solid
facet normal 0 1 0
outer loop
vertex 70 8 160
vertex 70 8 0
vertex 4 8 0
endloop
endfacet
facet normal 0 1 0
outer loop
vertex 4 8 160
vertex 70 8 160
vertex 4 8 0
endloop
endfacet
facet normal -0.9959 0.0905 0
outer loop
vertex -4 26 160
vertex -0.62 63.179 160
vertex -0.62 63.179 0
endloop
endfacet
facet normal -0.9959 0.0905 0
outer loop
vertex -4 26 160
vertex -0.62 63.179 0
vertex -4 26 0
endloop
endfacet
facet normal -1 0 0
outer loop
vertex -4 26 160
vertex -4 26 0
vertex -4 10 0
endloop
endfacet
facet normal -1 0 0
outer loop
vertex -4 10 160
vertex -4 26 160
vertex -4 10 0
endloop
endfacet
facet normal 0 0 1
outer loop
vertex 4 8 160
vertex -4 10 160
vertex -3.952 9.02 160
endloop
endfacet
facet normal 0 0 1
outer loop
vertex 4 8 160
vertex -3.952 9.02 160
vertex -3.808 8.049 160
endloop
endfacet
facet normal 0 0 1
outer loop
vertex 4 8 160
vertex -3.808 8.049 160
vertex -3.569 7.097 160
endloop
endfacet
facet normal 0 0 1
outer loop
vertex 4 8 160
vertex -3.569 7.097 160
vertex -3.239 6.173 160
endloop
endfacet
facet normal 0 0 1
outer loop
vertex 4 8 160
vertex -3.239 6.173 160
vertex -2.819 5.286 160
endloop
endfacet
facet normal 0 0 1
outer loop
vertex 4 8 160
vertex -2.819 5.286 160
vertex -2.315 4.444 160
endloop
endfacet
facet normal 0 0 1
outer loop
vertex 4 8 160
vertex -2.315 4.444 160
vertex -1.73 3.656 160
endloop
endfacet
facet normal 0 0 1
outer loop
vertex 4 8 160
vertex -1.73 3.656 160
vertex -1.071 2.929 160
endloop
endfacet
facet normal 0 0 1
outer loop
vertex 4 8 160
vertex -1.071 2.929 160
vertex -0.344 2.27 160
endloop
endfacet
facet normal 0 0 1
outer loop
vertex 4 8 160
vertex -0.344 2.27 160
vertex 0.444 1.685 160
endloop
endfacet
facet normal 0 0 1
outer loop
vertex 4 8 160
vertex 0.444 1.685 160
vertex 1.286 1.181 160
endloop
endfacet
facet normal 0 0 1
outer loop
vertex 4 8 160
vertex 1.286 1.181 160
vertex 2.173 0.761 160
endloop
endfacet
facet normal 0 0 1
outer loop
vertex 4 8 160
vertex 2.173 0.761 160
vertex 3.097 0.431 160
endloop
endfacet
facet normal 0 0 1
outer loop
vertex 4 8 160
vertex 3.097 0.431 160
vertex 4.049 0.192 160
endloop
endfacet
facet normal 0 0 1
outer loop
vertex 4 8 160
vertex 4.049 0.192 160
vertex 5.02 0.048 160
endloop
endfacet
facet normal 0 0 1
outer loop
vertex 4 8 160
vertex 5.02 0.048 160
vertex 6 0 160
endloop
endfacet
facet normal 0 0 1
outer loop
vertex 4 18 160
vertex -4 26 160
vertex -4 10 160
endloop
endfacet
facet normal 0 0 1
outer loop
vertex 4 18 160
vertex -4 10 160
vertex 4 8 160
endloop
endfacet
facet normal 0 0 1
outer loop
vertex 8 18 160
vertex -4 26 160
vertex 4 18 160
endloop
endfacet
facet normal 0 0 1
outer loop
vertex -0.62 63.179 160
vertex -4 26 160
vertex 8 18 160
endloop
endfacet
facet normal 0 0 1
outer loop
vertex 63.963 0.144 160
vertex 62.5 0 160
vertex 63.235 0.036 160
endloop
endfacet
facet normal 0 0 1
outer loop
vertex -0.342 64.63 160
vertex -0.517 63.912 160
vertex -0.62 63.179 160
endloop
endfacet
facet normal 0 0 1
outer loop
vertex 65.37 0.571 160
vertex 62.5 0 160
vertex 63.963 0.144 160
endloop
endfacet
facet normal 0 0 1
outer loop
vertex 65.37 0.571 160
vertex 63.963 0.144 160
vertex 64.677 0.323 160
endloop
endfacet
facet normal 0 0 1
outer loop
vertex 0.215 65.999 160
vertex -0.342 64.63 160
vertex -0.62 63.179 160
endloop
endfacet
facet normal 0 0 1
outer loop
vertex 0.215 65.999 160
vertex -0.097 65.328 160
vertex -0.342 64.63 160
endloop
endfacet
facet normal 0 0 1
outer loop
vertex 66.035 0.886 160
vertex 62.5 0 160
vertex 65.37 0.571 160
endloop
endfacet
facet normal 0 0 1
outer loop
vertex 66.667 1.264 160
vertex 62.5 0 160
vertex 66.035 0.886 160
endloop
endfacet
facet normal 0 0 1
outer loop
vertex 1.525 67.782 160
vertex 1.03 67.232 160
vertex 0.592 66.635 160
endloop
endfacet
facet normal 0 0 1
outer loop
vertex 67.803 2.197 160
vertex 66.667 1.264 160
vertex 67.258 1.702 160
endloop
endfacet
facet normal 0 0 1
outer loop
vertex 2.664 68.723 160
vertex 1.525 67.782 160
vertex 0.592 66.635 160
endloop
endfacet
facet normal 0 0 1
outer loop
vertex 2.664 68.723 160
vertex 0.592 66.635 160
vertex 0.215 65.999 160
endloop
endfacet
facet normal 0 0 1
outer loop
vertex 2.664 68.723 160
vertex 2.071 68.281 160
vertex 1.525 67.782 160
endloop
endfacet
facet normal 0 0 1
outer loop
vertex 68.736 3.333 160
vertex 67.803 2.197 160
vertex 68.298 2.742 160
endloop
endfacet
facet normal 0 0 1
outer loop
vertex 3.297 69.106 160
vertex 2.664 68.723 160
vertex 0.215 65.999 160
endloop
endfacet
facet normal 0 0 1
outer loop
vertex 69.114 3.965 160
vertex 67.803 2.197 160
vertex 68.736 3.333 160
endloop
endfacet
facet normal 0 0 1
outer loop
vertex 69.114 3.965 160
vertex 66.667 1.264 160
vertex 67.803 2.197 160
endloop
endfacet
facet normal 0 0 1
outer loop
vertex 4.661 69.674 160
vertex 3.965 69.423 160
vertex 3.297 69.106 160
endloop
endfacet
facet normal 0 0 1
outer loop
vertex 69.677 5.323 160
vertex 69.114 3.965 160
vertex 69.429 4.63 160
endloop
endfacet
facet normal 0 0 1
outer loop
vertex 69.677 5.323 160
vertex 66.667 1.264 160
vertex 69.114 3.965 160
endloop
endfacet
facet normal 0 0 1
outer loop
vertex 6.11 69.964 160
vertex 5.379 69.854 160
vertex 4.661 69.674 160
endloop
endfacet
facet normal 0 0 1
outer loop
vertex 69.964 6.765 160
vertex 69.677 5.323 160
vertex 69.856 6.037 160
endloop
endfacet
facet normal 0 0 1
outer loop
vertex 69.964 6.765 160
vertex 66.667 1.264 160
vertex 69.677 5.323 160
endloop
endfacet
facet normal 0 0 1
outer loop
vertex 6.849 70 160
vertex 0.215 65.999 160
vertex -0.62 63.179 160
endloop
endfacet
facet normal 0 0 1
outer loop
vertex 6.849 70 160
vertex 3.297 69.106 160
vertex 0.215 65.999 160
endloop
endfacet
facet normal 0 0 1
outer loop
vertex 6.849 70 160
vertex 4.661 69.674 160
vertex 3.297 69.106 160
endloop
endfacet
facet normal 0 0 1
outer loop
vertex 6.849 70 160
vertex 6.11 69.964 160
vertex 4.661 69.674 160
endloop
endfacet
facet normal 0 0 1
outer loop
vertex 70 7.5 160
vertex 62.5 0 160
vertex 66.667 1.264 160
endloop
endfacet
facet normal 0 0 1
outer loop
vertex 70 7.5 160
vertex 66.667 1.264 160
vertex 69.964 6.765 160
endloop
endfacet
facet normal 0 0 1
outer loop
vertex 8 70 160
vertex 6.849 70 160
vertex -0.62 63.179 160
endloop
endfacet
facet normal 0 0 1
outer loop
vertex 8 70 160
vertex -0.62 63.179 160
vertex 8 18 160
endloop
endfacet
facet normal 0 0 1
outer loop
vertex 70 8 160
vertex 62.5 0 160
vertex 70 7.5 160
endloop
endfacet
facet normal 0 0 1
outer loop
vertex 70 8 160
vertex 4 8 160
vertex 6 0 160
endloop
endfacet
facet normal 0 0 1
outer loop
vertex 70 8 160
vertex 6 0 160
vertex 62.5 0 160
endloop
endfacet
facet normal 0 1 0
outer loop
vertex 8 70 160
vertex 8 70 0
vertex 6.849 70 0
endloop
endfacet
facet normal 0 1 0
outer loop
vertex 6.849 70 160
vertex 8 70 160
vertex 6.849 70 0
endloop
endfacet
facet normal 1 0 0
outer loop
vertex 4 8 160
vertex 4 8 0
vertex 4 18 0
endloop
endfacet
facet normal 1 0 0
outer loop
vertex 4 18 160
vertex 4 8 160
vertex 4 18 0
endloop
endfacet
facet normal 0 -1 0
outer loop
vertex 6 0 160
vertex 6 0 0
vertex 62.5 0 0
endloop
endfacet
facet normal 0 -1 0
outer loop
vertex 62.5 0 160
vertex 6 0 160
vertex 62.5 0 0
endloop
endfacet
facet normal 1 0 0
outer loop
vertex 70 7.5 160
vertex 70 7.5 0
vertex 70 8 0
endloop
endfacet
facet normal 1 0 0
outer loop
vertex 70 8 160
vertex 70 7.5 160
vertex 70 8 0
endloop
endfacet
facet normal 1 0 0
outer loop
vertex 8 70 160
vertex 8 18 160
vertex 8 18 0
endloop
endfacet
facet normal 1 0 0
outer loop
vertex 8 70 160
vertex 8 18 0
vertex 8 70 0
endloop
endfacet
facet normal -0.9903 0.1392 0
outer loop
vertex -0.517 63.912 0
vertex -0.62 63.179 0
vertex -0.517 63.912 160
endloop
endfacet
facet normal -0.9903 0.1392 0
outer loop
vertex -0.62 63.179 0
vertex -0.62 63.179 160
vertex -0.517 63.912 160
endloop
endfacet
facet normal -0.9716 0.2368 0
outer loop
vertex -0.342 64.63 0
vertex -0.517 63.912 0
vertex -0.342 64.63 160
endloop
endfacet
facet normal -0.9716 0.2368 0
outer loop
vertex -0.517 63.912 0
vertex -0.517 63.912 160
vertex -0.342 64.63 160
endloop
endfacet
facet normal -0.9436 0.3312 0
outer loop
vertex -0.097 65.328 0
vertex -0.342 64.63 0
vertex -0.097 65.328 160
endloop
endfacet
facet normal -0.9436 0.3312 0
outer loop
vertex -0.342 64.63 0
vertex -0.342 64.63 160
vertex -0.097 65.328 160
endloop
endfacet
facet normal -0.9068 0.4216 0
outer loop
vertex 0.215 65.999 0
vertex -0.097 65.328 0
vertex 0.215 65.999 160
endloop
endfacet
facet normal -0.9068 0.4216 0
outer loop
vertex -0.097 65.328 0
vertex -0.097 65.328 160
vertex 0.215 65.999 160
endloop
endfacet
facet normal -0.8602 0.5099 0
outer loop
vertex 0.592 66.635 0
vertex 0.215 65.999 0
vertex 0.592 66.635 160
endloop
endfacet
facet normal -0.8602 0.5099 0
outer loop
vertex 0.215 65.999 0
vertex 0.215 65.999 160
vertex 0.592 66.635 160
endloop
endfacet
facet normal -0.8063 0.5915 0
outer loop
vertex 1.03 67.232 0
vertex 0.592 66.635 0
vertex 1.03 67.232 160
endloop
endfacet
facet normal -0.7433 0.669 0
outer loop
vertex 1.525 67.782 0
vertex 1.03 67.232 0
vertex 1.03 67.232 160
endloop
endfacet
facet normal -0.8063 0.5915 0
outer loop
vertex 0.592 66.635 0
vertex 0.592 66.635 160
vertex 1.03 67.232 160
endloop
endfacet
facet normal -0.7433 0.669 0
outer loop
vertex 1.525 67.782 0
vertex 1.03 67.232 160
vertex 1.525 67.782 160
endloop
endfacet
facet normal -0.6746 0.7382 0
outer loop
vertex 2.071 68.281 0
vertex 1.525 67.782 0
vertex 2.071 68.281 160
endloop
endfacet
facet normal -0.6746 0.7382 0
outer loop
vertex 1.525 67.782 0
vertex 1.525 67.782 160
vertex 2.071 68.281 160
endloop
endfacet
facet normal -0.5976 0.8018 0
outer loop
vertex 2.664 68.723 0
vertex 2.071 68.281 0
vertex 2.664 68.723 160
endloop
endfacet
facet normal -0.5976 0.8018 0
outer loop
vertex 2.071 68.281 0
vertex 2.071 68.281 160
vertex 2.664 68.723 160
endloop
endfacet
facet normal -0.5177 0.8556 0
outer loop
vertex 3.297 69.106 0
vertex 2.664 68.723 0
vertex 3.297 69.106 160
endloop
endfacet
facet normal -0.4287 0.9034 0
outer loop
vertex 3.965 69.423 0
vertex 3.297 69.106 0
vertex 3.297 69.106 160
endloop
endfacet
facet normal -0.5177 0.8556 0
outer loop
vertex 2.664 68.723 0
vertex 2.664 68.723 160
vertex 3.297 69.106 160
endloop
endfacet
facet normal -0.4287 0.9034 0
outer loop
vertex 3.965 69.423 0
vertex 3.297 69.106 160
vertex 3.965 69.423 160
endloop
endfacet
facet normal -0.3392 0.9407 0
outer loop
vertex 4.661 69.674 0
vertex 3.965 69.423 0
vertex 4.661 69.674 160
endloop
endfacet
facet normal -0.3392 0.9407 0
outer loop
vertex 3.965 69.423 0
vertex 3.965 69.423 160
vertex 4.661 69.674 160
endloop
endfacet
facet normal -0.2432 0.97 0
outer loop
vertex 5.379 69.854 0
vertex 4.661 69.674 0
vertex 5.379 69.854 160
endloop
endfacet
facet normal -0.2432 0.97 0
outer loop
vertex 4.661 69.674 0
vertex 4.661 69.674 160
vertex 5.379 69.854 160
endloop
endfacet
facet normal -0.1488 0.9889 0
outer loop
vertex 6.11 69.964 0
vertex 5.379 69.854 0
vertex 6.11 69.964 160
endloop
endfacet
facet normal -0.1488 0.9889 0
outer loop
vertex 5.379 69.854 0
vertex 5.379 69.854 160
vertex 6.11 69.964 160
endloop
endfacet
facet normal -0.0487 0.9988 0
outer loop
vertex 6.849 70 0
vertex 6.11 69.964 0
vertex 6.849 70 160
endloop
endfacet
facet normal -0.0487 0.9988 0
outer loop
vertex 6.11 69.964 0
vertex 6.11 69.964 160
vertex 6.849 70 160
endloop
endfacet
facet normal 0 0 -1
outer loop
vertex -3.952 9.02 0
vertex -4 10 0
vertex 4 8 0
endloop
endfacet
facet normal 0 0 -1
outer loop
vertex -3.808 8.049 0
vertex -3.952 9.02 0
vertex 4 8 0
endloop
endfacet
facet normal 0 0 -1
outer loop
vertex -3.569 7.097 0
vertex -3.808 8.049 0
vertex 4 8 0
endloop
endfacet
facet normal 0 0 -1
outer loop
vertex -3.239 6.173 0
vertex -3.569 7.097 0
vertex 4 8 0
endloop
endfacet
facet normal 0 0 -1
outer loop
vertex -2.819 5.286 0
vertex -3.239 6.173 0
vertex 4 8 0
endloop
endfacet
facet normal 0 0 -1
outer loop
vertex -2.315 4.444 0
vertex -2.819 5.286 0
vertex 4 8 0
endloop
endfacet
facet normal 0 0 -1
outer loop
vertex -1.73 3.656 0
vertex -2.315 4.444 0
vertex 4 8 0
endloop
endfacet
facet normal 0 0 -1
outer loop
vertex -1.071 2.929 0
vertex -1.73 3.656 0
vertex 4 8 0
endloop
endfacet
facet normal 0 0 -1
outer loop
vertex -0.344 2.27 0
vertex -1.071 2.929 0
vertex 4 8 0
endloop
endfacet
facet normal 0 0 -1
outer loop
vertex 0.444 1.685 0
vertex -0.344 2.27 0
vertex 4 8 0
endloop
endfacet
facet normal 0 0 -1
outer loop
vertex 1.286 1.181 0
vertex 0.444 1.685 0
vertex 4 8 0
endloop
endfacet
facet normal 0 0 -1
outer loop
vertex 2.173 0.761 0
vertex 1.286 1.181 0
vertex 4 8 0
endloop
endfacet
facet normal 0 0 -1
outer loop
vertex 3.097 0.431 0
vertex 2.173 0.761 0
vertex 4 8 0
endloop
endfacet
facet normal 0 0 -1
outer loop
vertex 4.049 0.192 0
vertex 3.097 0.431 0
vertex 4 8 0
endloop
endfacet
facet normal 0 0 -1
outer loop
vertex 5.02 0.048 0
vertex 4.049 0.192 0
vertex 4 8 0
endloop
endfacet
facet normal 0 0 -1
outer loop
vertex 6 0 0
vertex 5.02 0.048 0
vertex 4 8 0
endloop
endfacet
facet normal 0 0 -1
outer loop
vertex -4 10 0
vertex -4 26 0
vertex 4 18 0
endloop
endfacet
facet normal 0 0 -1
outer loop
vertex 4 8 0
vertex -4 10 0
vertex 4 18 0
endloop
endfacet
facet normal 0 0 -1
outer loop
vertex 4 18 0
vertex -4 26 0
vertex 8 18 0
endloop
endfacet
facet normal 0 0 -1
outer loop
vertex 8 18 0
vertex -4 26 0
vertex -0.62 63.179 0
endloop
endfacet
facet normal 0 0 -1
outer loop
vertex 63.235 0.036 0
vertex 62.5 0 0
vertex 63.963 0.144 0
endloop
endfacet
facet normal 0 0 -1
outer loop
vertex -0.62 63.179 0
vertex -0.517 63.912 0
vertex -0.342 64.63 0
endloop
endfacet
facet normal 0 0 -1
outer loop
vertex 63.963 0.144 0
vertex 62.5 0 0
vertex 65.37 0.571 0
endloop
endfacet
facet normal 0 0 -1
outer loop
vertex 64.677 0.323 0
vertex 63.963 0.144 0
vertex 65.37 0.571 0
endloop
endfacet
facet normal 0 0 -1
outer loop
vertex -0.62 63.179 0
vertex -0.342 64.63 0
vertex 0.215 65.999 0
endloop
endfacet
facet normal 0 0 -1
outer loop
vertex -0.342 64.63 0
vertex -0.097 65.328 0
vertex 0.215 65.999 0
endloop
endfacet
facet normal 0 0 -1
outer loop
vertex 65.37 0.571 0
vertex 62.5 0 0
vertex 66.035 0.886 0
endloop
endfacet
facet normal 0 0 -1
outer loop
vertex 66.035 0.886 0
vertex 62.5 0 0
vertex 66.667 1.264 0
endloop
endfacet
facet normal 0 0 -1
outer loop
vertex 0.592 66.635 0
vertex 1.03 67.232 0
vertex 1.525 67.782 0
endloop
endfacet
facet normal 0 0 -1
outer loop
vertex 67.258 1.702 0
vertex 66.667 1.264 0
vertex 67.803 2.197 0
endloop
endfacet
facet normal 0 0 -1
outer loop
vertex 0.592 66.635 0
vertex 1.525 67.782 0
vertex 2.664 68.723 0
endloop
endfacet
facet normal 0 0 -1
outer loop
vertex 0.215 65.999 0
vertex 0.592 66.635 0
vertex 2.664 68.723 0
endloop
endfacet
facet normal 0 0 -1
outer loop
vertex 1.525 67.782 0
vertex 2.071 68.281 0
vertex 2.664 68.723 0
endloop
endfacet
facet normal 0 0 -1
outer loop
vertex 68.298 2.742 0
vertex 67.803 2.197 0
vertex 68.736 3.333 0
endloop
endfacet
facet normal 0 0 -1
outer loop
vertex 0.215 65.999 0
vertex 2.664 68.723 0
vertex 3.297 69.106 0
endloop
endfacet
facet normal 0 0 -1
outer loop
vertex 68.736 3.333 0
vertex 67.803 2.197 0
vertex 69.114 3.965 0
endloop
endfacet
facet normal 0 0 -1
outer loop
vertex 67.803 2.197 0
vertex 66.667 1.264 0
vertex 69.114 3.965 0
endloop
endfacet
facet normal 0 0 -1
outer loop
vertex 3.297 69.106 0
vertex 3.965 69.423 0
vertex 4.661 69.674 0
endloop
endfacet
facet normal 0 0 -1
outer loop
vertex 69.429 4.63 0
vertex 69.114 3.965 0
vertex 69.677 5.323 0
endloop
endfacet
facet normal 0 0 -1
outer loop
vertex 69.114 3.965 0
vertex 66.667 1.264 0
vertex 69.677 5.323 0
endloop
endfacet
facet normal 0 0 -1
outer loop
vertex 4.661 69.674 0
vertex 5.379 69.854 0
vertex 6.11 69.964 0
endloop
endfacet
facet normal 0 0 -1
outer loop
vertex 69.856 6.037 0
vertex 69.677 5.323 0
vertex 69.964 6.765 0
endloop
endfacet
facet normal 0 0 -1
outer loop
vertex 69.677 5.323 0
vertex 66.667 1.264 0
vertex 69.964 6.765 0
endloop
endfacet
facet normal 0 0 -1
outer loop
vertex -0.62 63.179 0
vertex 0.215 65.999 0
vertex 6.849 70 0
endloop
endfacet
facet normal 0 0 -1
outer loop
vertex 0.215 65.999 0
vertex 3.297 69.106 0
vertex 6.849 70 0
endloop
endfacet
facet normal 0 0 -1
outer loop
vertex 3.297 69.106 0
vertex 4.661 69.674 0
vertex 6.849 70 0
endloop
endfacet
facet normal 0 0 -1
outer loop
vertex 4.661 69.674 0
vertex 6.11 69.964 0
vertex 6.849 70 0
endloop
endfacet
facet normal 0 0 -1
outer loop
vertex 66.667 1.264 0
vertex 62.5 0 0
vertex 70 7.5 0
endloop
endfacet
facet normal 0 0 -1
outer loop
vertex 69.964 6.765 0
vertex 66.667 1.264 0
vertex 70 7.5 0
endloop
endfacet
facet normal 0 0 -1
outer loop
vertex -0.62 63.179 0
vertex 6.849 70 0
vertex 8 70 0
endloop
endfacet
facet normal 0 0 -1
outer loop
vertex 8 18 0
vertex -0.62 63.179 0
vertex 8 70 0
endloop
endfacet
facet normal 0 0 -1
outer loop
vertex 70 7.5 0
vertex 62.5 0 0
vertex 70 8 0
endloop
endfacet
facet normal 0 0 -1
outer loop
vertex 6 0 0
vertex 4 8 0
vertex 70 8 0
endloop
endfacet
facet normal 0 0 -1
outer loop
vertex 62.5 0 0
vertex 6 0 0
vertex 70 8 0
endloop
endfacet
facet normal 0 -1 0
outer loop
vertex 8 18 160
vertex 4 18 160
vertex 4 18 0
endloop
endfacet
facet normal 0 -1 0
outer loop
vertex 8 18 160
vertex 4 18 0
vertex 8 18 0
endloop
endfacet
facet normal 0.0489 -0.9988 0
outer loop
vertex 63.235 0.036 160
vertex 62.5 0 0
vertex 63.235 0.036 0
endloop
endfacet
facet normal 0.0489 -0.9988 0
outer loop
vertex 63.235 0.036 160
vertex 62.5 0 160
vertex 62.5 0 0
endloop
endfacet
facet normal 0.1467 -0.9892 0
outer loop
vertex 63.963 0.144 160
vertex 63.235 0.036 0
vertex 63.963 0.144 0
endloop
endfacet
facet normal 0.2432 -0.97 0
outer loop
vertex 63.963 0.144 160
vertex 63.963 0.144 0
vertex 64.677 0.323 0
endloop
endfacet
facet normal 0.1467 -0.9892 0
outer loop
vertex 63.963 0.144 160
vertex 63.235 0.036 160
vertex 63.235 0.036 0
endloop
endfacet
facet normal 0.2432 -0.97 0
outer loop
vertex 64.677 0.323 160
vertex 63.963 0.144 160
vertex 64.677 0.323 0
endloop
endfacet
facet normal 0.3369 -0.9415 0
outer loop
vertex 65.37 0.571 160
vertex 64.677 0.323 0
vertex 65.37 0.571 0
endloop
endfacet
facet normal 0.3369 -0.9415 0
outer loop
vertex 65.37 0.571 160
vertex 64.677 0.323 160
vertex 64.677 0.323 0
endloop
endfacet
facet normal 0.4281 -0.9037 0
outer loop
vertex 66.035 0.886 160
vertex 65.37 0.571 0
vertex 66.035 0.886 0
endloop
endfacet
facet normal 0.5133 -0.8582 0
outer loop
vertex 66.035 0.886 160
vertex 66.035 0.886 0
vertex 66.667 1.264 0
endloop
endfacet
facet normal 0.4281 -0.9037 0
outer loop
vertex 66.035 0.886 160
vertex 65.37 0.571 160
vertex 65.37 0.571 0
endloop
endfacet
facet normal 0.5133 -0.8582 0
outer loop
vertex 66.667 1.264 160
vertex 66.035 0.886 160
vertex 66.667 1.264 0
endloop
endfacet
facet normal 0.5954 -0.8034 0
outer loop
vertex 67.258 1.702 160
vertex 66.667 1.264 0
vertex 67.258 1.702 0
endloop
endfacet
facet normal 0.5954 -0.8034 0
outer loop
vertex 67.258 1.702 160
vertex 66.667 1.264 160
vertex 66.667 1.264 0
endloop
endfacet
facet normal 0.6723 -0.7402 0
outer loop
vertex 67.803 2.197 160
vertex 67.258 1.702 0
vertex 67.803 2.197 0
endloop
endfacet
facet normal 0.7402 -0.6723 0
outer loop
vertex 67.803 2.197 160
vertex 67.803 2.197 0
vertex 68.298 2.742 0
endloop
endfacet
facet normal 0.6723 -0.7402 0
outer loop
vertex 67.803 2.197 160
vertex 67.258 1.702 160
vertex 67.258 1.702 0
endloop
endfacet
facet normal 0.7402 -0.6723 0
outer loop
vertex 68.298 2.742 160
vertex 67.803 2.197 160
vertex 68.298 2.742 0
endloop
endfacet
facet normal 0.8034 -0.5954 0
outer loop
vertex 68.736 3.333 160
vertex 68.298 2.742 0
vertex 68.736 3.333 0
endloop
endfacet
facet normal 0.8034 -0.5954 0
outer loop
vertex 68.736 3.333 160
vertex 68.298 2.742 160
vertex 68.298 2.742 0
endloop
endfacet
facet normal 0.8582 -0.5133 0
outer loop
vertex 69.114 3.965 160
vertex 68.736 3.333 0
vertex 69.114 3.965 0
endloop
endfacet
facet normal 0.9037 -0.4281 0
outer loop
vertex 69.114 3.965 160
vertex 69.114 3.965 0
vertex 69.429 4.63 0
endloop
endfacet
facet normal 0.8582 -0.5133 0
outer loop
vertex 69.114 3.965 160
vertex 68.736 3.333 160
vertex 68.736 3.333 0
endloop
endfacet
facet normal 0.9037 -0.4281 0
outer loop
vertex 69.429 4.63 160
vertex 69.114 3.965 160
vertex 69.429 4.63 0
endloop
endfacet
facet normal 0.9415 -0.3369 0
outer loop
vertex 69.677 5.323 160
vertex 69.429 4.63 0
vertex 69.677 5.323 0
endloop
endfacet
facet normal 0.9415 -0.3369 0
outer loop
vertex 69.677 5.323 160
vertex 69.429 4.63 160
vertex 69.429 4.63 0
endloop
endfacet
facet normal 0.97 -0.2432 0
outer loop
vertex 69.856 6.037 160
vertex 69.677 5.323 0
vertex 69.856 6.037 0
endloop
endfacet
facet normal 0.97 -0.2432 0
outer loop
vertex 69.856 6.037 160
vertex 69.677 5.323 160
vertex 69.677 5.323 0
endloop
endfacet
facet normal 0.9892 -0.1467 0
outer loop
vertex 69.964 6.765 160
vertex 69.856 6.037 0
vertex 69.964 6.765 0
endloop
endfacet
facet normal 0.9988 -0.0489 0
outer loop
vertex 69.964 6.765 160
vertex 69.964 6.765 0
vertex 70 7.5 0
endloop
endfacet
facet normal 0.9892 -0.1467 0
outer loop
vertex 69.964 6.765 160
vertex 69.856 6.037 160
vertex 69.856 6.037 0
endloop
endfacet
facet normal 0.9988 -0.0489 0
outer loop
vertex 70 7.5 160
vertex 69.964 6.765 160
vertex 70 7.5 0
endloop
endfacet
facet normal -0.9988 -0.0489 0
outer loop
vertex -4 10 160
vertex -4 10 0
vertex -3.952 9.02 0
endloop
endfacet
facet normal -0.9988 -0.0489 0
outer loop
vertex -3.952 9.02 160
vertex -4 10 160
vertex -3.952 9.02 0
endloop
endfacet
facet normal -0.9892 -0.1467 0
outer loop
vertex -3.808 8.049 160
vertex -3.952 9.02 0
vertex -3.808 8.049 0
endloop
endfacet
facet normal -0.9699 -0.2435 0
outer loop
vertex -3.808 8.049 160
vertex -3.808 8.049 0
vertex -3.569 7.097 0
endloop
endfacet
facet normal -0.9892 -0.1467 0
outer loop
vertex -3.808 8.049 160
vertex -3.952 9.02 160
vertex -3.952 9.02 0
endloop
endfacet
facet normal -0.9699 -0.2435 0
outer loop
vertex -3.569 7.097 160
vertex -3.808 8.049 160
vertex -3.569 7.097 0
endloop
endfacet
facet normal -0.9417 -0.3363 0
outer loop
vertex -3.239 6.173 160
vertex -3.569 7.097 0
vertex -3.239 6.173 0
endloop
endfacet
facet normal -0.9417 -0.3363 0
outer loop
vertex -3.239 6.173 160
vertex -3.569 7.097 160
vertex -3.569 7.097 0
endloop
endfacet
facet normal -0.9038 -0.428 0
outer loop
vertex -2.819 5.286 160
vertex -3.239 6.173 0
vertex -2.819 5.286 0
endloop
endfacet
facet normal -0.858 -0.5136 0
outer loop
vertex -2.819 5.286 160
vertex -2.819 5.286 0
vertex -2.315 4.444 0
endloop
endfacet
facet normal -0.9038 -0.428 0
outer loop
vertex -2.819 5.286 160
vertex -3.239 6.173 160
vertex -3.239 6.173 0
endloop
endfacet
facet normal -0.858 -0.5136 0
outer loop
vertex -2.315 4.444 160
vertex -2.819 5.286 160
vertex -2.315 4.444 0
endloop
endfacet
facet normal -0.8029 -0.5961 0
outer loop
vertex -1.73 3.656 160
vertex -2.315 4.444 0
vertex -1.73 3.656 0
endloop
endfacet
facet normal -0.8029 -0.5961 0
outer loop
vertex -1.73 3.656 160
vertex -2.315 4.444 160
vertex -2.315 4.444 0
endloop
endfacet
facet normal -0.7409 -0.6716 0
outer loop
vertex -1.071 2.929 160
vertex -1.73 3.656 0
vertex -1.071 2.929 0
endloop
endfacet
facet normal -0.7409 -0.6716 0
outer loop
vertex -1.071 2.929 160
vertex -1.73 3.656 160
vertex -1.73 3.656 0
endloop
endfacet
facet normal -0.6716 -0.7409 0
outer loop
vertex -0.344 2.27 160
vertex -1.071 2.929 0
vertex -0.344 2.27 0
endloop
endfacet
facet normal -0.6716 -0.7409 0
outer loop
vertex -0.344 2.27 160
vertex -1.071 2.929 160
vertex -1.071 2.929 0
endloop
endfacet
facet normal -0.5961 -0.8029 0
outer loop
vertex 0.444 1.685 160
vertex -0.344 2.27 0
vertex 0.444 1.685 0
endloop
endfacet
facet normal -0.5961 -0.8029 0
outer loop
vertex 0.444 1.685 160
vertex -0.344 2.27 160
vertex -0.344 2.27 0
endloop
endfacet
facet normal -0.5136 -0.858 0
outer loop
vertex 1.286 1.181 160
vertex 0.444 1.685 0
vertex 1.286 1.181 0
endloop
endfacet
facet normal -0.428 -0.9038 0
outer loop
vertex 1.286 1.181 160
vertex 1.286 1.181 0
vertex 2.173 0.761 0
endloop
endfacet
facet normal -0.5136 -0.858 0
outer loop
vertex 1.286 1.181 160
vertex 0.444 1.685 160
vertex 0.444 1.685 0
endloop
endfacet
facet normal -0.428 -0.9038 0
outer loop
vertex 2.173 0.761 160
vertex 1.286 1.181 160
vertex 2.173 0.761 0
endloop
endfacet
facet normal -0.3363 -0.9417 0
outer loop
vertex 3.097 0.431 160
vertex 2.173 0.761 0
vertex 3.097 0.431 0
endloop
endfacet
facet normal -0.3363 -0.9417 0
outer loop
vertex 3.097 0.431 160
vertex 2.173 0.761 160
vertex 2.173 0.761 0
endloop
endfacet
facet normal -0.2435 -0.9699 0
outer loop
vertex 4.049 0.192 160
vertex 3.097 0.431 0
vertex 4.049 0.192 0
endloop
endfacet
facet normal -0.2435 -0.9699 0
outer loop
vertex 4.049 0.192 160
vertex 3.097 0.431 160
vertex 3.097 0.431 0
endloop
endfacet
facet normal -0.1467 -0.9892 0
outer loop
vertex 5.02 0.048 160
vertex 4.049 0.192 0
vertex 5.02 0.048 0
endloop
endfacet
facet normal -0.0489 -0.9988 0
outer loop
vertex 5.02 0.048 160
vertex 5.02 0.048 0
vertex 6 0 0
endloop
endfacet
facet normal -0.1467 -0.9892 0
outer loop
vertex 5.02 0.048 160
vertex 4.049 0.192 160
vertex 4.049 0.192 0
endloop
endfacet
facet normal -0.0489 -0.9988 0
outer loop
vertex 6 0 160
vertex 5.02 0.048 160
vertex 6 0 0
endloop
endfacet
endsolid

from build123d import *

# Parameters (mm, degrees)
PAD_DEPTH   = 160
FILLET_R    = 10
FILLET001_R = 7.5


with BuildPart() as part:
    # Sketch → Pad (new body)
    with BuildSketch(Plane.XY):
        Polygon((0, 0), (70, 0), (70, 8), (4, 8), (4, 18), (8, 18), (8, 70), (0, 70), (-4, 26), (-4, 0), align=None)
    extrude(amount=PAD_DEPTH)

    # Fillet
    fillet_edges = [part.edges().sort_by_distance(p)[0] for p in [
        (-4, 0, 80),
    ]]
    fillet(fillet_edges, radius=FILLET_R)

    # Fillet001
    fillet001_edges = [part.edges().sort_by_distance(p)[0] for p in [
        (0, 70, 80),
        (70, 0, 80),
    ]]
    fillet(fillet001_edges, radius=FILLET001_R)


solid = part.part
